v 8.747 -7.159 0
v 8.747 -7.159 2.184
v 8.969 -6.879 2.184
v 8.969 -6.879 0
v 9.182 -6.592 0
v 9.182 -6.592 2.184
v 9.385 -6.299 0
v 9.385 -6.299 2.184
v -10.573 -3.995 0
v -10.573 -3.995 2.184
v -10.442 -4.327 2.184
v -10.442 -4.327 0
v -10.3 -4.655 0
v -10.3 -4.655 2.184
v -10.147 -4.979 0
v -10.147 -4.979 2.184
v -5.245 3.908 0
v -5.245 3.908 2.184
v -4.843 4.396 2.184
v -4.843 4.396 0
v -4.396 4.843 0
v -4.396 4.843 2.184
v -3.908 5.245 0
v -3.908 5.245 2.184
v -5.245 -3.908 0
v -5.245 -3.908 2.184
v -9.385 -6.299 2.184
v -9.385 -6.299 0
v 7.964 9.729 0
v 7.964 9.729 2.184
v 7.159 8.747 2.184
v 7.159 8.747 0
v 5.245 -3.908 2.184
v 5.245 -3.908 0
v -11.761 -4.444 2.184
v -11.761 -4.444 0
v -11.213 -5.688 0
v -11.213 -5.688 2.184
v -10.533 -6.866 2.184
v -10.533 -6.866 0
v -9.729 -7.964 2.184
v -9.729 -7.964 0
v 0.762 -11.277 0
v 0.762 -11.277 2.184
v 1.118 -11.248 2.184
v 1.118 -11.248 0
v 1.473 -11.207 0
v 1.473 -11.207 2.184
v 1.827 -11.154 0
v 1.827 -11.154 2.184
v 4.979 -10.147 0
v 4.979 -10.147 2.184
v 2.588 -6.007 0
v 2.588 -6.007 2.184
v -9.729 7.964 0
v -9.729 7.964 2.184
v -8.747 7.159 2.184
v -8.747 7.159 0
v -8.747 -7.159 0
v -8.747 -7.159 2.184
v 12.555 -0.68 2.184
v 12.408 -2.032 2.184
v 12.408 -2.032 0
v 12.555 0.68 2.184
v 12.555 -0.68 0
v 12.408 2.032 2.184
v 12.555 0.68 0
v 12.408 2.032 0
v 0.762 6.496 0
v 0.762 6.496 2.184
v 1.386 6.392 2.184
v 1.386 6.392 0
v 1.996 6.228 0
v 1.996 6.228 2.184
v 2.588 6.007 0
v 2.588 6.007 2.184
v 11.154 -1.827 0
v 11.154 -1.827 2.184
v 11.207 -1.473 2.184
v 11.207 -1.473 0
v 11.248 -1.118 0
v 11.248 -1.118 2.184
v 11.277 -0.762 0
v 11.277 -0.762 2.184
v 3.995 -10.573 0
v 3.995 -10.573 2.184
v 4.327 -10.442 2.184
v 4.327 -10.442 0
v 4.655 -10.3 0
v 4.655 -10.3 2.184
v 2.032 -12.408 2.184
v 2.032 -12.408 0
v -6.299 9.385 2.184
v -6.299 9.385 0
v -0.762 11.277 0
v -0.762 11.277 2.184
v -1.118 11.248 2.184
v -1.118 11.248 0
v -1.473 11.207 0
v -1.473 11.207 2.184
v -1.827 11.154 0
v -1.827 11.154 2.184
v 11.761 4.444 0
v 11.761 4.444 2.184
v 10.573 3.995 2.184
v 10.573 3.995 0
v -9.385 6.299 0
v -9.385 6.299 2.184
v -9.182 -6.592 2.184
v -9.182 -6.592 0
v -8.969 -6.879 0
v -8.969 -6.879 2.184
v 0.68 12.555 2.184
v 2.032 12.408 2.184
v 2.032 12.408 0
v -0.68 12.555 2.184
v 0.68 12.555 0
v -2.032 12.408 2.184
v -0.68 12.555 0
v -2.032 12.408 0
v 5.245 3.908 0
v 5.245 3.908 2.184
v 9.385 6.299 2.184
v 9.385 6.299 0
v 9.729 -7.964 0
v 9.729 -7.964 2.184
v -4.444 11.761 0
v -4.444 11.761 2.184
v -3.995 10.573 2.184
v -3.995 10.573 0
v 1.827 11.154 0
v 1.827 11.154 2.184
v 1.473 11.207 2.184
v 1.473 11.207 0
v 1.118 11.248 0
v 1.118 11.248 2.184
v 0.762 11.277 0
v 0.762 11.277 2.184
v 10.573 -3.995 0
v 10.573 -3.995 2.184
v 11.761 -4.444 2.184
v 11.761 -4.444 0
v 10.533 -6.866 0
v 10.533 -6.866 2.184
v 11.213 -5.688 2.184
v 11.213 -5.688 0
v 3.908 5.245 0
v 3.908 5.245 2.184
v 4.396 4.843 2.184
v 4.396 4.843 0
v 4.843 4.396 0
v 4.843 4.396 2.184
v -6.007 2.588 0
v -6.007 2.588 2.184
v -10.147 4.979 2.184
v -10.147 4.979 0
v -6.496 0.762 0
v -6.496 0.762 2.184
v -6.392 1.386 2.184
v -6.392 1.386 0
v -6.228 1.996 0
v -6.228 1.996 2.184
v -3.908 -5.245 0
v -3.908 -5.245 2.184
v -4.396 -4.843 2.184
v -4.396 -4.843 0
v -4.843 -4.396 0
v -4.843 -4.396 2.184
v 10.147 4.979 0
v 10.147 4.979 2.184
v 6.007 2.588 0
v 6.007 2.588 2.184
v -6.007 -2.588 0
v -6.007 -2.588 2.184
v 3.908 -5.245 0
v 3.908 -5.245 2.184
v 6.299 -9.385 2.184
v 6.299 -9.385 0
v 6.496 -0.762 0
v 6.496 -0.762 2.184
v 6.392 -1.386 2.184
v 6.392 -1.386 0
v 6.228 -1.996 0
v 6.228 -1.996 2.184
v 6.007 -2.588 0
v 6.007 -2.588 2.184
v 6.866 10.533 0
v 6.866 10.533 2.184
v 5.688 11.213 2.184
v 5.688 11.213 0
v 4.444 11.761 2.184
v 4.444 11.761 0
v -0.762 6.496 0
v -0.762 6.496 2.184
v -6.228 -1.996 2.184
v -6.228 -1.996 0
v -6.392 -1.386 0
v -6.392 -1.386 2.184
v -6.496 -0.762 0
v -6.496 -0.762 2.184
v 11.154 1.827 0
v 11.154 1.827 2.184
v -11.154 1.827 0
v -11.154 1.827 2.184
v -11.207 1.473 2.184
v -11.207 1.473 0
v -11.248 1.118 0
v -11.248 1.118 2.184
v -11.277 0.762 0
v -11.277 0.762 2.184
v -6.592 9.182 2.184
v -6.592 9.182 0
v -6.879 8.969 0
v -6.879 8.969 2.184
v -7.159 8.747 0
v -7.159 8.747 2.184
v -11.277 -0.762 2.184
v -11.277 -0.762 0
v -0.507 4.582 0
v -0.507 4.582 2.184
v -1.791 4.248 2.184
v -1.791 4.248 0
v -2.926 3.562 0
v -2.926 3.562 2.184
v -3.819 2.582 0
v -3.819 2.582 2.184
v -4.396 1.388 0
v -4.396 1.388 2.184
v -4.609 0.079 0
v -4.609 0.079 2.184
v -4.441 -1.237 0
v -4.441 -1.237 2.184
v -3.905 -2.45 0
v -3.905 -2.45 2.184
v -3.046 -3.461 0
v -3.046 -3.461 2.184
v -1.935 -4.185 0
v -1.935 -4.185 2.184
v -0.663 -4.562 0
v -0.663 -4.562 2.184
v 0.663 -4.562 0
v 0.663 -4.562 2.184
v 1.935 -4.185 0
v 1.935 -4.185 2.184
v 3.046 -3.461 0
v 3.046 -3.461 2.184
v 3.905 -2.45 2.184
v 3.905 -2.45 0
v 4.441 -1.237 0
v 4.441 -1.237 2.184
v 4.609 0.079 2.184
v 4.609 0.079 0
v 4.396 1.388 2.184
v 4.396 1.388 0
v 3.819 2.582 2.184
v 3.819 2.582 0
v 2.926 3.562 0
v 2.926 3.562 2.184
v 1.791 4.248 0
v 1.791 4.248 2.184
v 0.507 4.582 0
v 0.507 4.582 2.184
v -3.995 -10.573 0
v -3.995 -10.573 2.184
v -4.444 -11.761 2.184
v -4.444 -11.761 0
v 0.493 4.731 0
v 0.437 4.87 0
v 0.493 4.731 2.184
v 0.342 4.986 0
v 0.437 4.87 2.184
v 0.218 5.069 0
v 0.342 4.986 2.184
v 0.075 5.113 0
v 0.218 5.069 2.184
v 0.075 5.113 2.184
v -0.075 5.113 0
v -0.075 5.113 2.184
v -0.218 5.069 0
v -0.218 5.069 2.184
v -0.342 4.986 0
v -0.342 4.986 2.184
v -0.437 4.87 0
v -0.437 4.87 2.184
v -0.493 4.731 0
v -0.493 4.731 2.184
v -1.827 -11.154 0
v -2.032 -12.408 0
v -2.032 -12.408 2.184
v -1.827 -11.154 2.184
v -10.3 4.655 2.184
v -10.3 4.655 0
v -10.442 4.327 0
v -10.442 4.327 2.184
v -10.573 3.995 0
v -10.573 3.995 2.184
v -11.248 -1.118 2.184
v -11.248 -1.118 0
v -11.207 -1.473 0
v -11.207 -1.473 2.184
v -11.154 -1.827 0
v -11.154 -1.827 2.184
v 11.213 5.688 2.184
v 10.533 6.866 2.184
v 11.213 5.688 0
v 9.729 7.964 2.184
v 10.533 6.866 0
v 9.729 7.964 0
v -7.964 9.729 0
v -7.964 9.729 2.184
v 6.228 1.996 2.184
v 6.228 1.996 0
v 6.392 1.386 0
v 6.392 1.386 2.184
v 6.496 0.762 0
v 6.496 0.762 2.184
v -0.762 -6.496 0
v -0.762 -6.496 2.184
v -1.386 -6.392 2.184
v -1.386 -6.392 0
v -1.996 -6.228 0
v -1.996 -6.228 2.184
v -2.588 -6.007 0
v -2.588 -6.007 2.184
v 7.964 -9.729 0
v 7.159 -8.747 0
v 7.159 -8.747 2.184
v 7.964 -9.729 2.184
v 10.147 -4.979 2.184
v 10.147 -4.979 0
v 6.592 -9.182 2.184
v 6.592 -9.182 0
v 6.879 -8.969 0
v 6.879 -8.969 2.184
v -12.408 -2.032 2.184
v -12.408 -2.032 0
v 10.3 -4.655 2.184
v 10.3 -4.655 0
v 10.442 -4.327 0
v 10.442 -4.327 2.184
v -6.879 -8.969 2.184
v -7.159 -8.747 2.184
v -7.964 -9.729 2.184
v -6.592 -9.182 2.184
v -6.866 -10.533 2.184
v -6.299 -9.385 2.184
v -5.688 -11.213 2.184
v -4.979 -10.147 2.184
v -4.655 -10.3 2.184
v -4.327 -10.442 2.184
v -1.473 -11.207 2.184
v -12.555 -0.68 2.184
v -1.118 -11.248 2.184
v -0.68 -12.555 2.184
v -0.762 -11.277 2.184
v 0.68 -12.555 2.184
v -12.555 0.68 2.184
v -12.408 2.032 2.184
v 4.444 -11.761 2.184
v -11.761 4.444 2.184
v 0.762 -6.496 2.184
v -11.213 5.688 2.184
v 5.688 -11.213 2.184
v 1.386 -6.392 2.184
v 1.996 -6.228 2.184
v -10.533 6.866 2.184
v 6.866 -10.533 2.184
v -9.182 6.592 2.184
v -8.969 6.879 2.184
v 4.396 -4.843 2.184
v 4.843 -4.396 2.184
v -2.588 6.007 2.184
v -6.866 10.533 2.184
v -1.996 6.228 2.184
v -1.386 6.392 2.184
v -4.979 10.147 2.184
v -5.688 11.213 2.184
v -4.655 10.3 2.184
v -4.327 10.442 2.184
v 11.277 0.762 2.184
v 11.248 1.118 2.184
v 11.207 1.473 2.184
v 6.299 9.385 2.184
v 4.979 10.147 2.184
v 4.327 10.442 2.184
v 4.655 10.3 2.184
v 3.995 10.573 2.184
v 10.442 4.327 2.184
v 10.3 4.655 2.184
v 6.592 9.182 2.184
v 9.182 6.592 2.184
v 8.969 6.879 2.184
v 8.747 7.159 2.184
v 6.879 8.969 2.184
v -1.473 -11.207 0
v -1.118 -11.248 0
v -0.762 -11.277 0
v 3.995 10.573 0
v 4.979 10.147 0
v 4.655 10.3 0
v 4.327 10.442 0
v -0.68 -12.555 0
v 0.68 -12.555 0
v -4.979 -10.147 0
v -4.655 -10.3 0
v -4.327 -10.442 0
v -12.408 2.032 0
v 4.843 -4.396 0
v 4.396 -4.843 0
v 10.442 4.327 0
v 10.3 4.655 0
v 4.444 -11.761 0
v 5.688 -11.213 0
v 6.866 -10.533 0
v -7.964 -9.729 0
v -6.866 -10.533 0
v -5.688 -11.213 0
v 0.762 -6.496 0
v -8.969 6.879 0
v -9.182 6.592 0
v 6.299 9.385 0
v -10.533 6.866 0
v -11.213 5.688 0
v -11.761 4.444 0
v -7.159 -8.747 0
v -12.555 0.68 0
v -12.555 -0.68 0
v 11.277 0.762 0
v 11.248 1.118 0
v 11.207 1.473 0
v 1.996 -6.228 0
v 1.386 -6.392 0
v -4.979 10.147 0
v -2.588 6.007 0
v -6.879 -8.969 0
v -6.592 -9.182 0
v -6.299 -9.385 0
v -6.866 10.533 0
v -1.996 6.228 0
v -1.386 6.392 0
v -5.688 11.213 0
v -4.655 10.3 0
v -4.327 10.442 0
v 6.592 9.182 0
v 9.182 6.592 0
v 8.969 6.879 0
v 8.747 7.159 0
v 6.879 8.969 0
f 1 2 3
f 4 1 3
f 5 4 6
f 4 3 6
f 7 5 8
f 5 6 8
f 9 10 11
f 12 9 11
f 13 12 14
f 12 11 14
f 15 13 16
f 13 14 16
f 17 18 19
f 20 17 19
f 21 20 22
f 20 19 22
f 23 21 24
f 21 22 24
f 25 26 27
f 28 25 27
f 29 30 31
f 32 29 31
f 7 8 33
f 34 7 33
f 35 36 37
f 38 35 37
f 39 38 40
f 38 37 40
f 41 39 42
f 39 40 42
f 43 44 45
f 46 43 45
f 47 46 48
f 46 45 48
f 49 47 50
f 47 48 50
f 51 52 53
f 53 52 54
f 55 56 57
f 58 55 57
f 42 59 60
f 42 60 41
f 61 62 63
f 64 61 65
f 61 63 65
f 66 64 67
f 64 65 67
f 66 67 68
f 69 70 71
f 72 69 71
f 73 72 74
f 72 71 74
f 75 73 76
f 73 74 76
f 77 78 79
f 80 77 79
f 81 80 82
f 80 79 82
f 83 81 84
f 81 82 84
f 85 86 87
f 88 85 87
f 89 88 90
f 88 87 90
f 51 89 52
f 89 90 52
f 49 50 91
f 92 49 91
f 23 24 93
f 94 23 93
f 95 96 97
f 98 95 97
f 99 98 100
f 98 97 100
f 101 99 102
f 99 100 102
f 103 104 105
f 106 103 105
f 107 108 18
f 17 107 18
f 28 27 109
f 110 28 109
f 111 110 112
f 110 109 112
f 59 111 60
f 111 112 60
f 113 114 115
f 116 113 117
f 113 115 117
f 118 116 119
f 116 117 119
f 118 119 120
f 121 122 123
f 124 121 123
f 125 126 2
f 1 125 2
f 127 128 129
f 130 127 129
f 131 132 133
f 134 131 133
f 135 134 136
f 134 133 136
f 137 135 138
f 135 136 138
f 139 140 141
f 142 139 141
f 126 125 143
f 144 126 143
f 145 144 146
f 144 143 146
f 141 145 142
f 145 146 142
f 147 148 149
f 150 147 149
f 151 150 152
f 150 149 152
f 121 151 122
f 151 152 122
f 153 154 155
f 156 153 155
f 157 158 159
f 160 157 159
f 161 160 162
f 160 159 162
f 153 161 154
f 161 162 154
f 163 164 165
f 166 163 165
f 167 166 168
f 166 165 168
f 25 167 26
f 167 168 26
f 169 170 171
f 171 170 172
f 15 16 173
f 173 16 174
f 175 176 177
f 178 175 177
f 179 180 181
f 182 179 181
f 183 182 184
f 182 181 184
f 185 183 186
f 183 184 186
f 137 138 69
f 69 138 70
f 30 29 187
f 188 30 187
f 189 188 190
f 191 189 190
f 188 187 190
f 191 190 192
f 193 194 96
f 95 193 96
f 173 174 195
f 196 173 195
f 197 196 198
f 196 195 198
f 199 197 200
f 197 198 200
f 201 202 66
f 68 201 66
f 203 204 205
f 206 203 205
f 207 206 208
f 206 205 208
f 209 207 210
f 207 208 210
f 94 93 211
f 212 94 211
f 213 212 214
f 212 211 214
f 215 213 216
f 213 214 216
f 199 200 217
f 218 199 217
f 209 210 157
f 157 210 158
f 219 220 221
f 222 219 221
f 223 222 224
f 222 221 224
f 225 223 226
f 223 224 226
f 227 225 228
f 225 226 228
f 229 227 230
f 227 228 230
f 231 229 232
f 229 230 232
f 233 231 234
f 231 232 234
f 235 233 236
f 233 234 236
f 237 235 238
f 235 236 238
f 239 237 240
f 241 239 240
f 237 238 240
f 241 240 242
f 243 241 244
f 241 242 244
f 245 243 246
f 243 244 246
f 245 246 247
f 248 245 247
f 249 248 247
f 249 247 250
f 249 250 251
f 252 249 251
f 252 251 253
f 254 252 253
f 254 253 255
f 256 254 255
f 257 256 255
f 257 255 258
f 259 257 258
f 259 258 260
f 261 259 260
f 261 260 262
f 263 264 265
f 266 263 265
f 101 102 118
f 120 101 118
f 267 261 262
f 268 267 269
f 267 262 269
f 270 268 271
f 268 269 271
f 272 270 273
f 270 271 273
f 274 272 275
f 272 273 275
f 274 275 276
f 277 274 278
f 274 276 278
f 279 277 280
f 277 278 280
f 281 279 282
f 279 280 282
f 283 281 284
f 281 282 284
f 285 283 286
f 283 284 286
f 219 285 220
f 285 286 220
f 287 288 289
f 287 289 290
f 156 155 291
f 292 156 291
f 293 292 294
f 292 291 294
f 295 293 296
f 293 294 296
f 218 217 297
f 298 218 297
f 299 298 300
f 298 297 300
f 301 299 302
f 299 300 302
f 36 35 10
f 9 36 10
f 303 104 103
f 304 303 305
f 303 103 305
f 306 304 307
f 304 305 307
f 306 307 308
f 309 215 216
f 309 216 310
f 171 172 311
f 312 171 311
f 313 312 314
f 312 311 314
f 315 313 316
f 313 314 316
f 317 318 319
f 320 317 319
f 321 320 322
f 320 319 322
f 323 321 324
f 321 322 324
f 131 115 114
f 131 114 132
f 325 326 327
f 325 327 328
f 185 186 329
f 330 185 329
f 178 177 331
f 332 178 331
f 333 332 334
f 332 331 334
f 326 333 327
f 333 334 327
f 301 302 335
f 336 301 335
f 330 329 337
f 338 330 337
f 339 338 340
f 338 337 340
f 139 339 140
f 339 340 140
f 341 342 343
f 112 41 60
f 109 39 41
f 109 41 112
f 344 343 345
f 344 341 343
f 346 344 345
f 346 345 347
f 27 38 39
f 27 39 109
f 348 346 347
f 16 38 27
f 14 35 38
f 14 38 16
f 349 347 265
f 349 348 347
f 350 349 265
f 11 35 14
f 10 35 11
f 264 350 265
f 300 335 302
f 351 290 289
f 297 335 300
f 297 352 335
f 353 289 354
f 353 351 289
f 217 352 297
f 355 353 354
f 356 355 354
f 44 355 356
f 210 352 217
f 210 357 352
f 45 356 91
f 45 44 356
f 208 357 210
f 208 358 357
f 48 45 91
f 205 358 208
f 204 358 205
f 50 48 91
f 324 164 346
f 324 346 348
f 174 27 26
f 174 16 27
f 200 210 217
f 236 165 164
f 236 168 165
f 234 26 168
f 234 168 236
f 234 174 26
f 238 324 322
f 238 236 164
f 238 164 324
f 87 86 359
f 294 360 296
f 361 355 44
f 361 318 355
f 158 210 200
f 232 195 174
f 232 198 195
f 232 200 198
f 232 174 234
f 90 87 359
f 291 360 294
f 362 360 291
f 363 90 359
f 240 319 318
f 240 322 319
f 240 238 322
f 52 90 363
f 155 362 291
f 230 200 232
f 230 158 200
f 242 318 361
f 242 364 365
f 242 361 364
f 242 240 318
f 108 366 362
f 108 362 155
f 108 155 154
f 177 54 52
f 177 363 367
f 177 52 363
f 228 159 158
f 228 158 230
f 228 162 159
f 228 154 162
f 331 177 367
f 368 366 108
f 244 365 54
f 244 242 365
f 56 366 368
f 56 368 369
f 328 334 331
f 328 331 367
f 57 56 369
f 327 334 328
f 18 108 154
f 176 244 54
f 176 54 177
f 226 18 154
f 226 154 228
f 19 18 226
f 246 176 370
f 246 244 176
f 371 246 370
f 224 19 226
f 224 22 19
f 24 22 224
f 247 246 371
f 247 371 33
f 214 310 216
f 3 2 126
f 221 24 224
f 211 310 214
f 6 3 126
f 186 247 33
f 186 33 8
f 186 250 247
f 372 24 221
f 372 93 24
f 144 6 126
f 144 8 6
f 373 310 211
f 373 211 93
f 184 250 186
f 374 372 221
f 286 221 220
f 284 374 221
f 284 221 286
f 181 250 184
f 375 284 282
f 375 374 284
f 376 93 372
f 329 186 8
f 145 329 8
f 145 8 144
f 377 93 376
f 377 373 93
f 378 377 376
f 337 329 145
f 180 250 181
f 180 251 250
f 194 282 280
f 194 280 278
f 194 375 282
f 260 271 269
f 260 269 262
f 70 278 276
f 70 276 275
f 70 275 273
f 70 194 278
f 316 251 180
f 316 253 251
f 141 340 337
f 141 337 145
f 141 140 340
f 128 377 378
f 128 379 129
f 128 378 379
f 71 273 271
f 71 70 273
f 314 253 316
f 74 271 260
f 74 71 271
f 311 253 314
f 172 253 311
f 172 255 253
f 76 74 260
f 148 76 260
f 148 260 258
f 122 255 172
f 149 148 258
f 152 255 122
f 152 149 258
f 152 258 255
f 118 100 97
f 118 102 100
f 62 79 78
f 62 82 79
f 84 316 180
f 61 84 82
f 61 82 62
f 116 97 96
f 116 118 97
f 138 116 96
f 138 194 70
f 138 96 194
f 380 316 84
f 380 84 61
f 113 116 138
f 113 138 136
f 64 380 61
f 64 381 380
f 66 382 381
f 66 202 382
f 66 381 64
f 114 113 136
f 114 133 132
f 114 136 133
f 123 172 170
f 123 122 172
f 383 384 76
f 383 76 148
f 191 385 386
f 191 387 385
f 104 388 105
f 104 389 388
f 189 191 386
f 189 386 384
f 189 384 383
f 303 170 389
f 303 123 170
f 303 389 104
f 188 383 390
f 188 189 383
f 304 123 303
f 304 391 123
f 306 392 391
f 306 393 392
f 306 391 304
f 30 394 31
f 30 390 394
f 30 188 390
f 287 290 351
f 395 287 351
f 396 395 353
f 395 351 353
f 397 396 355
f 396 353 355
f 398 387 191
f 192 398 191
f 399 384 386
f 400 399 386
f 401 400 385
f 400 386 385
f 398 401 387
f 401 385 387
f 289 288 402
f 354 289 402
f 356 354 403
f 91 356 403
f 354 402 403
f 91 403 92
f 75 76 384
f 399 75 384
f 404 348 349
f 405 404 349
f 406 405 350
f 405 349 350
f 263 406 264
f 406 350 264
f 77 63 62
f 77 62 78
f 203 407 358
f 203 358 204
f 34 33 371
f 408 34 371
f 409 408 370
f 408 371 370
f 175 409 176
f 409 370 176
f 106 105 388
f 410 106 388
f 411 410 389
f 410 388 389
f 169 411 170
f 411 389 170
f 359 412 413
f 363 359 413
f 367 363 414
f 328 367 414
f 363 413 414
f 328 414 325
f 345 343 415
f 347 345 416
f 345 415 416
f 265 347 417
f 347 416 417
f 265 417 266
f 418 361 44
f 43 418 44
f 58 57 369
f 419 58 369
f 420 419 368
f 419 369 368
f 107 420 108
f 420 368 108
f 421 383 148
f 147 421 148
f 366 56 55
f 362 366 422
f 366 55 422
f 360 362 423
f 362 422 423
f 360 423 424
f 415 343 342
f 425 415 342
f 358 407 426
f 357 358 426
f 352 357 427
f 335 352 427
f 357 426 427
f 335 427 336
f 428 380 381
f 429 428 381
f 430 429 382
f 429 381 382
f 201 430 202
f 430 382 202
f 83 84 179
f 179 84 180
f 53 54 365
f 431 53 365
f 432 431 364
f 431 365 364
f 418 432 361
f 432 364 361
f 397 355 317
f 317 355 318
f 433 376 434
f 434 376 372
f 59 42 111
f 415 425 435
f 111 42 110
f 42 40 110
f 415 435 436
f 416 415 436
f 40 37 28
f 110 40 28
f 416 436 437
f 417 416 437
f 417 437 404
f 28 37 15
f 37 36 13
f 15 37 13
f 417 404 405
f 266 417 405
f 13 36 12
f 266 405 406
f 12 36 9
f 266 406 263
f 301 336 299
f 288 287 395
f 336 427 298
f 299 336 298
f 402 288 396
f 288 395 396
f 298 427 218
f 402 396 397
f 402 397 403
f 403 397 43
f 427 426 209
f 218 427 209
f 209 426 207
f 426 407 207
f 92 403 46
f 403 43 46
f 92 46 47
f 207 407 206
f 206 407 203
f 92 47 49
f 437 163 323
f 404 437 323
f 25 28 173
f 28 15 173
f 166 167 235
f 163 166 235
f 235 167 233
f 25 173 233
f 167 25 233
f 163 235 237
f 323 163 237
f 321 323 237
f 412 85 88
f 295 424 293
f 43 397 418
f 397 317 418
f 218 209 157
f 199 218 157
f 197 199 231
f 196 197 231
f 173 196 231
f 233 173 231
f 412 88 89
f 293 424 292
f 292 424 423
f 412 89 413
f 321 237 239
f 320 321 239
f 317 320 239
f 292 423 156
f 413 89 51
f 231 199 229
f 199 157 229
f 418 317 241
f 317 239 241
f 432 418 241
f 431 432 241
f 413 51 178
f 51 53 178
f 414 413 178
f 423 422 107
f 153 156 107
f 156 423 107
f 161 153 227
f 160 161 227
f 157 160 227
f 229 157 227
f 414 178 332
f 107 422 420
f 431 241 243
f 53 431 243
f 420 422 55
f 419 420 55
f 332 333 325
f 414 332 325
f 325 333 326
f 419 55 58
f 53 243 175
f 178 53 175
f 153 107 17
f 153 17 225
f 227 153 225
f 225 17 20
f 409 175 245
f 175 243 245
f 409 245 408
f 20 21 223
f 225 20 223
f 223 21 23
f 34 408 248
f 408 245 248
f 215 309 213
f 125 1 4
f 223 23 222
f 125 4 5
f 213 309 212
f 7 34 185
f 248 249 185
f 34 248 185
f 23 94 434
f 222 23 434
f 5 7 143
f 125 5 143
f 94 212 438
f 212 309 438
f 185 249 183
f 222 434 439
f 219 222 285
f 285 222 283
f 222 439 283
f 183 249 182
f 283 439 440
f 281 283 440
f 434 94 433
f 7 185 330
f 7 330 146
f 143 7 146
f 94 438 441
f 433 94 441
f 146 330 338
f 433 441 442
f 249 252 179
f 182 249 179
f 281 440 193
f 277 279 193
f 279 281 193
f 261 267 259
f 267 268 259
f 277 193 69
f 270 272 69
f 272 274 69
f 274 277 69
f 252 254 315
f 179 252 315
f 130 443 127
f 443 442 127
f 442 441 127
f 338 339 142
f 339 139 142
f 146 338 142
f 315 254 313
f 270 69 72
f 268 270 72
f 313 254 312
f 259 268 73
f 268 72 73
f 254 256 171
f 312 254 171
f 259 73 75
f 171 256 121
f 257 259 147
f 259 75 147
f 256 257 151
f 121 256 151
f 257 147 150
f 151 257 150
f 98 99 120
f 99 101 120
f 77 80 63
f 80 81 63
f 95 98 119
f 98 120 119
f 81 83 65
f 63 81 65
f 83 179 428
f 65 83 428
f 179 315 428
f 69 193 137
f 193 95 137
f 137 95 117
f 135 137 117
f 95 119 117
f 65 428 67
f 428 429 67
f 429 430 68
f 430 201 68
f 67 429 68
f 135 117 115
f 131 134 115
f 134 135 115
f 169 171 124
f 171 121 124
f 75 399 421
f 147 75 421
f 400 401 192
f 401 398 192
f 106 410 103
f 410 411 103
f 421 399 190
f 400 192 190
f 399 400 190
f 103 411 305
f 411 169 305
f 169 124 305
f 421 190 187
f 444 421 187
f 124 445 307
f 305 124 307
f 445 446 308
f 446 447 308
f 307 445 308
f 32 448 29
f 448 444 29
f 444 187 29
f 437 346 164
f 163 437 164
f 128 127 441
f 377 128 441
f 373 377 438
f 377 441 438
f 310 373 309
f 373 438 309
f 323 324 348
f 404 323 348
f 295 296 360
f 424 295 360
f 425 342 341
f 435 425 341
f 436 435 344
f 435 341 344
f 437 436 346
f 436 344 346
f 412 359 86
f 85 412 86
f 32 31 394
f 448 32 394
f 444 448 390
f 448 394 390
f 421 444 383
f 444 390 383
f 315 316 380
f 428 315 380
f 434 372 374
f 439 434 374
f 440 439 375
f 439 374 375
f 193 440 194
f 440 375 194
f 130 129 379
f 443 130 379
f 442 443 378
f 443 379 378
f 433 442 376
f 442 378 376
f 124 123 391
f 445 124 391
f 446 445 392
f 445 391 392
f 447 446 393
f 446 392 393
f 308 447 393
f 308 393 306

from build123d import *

# Parameters (mm, degrees)
SKETCH1_R          = 12.573
EXTRUDE1_DEPTH     = 2.1844
CUT_EXTRUDE1_DEPTH = 18.914582366
SKETCH4_R          = 4.6101
CUT_EXTRUDE2_DEPTH = 18.914582366
SKETCH5_R          = 0.508
CUT_EXTRUDE3_DEPTH = 18.914582366


with BuildPart() as part:
    # Sketch1 → Extrude1 (new body)
    with BuildSketch(Plane.XY):
        Circle(SKETCH1_R)
    extrude(amount=EXTRUDE1_DEPTH)

    # Sketch2 → Cut-Extrude1 (cut, through all)
    with BuildSketch(Plane.XY.offset(2.1844)):
        with BuildLine():
            Line((-7.159213379, 8.746626366), (-7.963619377, 9.729393373))
            ThreePointArc((-7.963619377, 9.729393373), (-8.89045356, 8.89045356), (-9.729393373, 7.963619377))
            Line((-9.729393373, 7.963619377), (-8.746626366, 7.159213379))
            ThreePointArc((-8.746626366, 7.159213379), (-9.076228299, 6.736459669), (-9.385415604, 6.298554036))
            Line((-9.385415604, 6.298554036), (-5.244666377, 3.907891355))
            ThreePointArc((-5.244666377, 3.907891355), (-4.624831902, 4.624831902), (-3.907891355, 5.244666377))
            Line((-3.907891355, 5.244666377), (-6.298554036, 9.385415604))
            ThreePointArc((-6.298554036, 9.385415604), (-6.736459669, 9.076228299), (-7.159213379, 8.746626366))
        make_face()
        with BuildLine():
            Line((-10.573373841, 3.995193941), (-11.761393373, 4.444092136))
            ThreePointArc((-11.761393373, 4.444092136), (-12.144585414, 3.254131854), (-12.407711513, 2.032))
            Line((-12.407711513, 2.032), (-11.15440732, 1.826747475))
            ThreePointArc((-11.15440732, 1.826747475), (-11.228474112, 1.295831056), (-11.277285356, 0.762))
            Line((-11.277285356, 0.762), (-6.495959994, 0.762))
            ThreePointArc((-6.495959994, 0.762), (-6.317637867, 1.692805964), (-6.006666377, 2.58806864))
            Line((-6.006666377, 2.58806864), (-10.147415604, 4.97873132))
            ThreePointArc((-10.147415604, 4.97873132), (-10.372059354, 4.492014443), (-10.573373841, 3.995193941))
        make_face()
        with BuildLine():
            Line((-11.15440732, -1.826747475), (-12.407711513, -2.032))
            ThreePointArc((-12.407711513, -2.032), (-12.144585414, -3.254131854), (-11.761393373, -4.444092136))
            Line((-11.761393373, -4.444092136), (-10.573373841, -3.995193941))
            ThreePointArc((-10.573373841, -3.995193941), (-10.372059354, -4.492014443), (-10.147415604, -4.97873132))
            Line((-10.147415604, -4.97873132), (-6.006666377, -2.58806864))
            ThreePointArc((-6.006666377, -2.58806864), (-6.317637867, -1.692805964), (-6.495959994, -0.762))
            Line((-6.495959994, -0.762), (-11.277285356, -0.762))
            ThreePointArc((-11.277285356, -0.762), (-11.228474112, -1.295831056), (-11.15440732, -1.826747475))
        make_face()
        with BuildLine():
            Line((-8.746626366, -7.159213379), (-9.729393373, -7.963619377))
            ThreePointArc((-9.729393373, -7.963619377), (-8.89045356, -8.89045356), (-7.963619377, -9.729393373))
            Line((-7.963619377, -9.729393373), (-7.159213379, -8.746626366))
            ThreePointArc((-7.159213379, -8.746626366), (-6.736459669, -9.076228299), (-6.298554036, -9.385415604))
            Line((-6.298554036, -9.385415604), (-3.907891355, -5.244666377))
            ThreePointArc((-3.907891355, -5.244666377), (-4.624831902, -4.624831902), (-5.244666377, -3.907891355))
            Line((-5.244666377, -3.907891355), (-9.385415604, -6.298554036))
            ThreePointArc((-9.385415604, -6.298554036), (-9.076228299, -6.736459669), (-8.746626366, -7.159213379))
        make_face()
        with BuildLine():
            ThreePointArc((-4.444092136, -11.761393373), (-3.254131854, -12.144585414), (-2.032, -12.407711513))
            Line((-2.032, -12.407711513), (-1.826747475, -11.15440732))
            ThreePointArc((-1.826747475, -11.15440732), (-1.295831056, -11.228474112), (-0.762, -11.277285356))
            Line((-0.762, -11.277285356), (-0.762, -6.495959994))
            ThreePointArc((-0.762, -6.495959994), (-1.692805964, -6.317637867), (-2.58806864, -6.006666377))
            Line((-2.58806864, -6.006666377), (-4.97873132, -10.147415604))
            ThreePointArc((-4.97873132, -10.147415604), (-4.492014443, -10.372059354), (-3.995193941, -10.573373841))
            Line((-3.995193941, -10.573373841), (-4.444092136, -11.761393373))
        make_face()
        with BuildLine():
            ThreePointArc((2.032, -12.407711513), (3.254131854, -12.144585414), (4.444092136, -11.761393373))
            Line((4.444092136, -11.761393373), (3.995193941, -10.573373841))
            ThreePointArc((3.995193941, -10.573373841), (4.492014443, -10.372059354), (4.97873132, -10.147415604))
            Line((4.97873132, -10.147415604), (2.58806864, -6.006666377))
            ThreePointArc((2.58806864, -6.006666377), (1.692805964, -6.317637867), (0.762, -6.495959994))
            Line((0.762, -6.495959994), (0.762, -11.277285356))
            ThreePointArc((0.762, -11.277285356), (1.295831056, -11.228474112), (1.826747475, -11.15440732))
            Line((1.826747475, -11.15440732), (2.032, -12.407711513))
        make_face()
        with BuildLine():
            ThreePointArc((7.963619377, -9.729393373), (8.89045356, -8.89045356), (9.729393373, -7.963619377))
            Line((9.729393373, -7.963619377), (8.746626366, -7.159213379))
            ThreePointArc((8.746626366, -7.159213379), (9.076228299, -6.736459669), (9.385415604, -6.298554036))
            Line((9.385415604, -6.298554036), (5.244666377, -3.907891355))
            ThreePointArc((5.244666377, -3.907891355), (4.624831902, -4.624831902), (3.907891355, -5.244666377))
            Line((3.907891355, -5.244666377), (6.298554036, -9.385415604))
            ThreePointArc((6.298554036, -9.385415604), (6.736459669, -9.076228299), (7.159213379, -8.746626366))
            Line((7.159213379, -8.746626366), (7.963619377, -9.729393373))
        make_face()
        with BuildLine():
            ThreePointArc((11.761393373, -4.444092136), (12.144585414, -3.254131854), (12.407711513, -2.032))
            Line((12.407711513, -2.032), (11.15440732, -1.826747475))
            ThreePointArc((11.15440732, -1.826747475), (11.228474112, -1.295831056), (11.277285356, -0.762))
            Line((11.277285356, -0.762), (6.495959994, -0.762))
            ThreePointArc((6.495959994, -0.762), (6.317637867, -1.692805964), (6.006666377, -2.58806864))
            Line((6.006666377, -2.58806864), (10.147415604, -4.97873132))
            ThreePointArc((10.147415604, -4.97873132), (10.372059354, -4.492014443), (10.573373841, -3.995193941))
            Line((10.573373841, -3.995193941), (11.761393373, -4.444092136))
        make_face()
        with BuildLine():
            ThreePointArc((12.407711513, 2.032), (12.144585414, 3.254131854), (11.761393373, 4.444092136))
            Line((11.761393373, 4.444092136), (10.573373841, 3.995193941))
            ThreePointArc((10.573373841, 3.995193941), (10.372059354, 4.492014443), (10.147415604, 4.97873132))
            Line((10.147415604, 4.97873132), (6.006666377, 2.58806864))
            ThreePointArc((6.006666377, 2.58806864), (6.317637867, 1.692805964), (6.495959994, 0.762))
            Line((6.495959994, 0.762), (11.277285356, 0.762))
            ThreePointArc((11.277285356, 0.762), (11.228474112, 1.295831056), (11.15440732, 1.826747475))
            Line((11.15440732, 1.826747475), (12.407711513, 2.032))
        make_face()
        with BuildLine():
            ThreePointArc((9.729393373, 7.963619377), (8.89045356, 8.89045356), (7.963619377, 9.729393373))
            Line((7.963619377, 9.729393373), (7.159213379, 8.746626366))
            ThreePointArc((7.159213379, 8.746626366), (6.736459669, 9.076228299), (6.298554036, 9.385415604))
            Line((6.298554036, 9.385415604), (3.907891355, 5.244666377))
            ThreePointArc((3.907891355, 5.244666377), (4.624831902, 4.624831902), (5.244666377, 3.907891355))
            Line((5.244666377, 3.907891355), (9.385415604, 6.298554036))
            ThreePointArc((9.385415604, 6.298554036), (9.076228299, 6.736459669), (8.746626366, 7.159213379))
            Line((8.746626366, 7.159213379), (9.729393373, 7.963619377))
        make_face()
        with BuildLine():
            ThreePointArc((4.97873132, 10.147415604), (4.492014443, 10.372059354), (3.995193941, 10.573373841))
            Line((3.995193941, 10.573373841), (4.444092136, 11.761393373))
            ThreePointArc((4.444092136, 11.761393373), (3.254131854, 12.144585414), (2.032, 12.407711513))
            Line((2.032, 12.407711513), (1.826747475, 11.15440732))
            ThreePointArc((1.826747475, 11.15440732), (1.295831056, 11.228474112), (0.762, 11.277285356))
            Line((0.762, 11.277285356), (0.762, 6.495959994))
            ThreePointArc((0.762, 6.495959994), (1.692805964, 6.317637867), (2.58806864, 6.006666377))
            Line((2.58806864, 6.006666377), (4.97873132, 10.147415604))
        make_face()
        with BuildLine():
            Line((-1.826747475, 11.15440732), (-2.032, 12.407711513))
            ThreePointArc((-2.032, 12.407711513), (-3.254131854, 12.144585414), (-4.444092136, 11.761393373))
            Line((-4.444092136, 11.761393373), (-3.995193941, 10.573373841))
            ThreePointArc((-3.995193941, 10.573373841), (-4.492014443, 10.372059354), (-4.97873132, 10.147415604))
            Line((-4.97873132, 10.147415604), (-2.58806864, 6.006666377))
            ThreePointArc((-2.58806864, 6.006666377), (-1.692805964, 6.317637867), (-0.762, 6.495959994))
            Line((-0.762, 6.495959994), (-0.762, 11.277285356))
            ThreePointArc((-0.762, 11.277285356), (-1.295831056, 11.228474112), (-1.826747475, 11.15440732))
        make_face()
    extrude(amount=-CUT_EXTRUDE1_DEPTH, mode=Mode.SUBTRACT)

    # Sketch4 → Cut-Extrude2 (cut, through all)
    with BuildSketch(Plane.XY.offset(2.1844)):
        Circle(SKETCH4_R)
    extrude(amount=-CUT_EXTRUDE2_DEPTH, mode=Mode.SUBTRACT)

    # Sketch5 → Cut-Extrude3 (cut, through all)
    with BuildSketch(Plane.XY.offset(2.1844)):
        with Locations((0, 4.6101)):
            Circle(SKETCH5_R)
    extrude(amount=-CUT_EXTRUDE3_DEPTH, mode=Mode.SUBTRACT)


solid = part.part
